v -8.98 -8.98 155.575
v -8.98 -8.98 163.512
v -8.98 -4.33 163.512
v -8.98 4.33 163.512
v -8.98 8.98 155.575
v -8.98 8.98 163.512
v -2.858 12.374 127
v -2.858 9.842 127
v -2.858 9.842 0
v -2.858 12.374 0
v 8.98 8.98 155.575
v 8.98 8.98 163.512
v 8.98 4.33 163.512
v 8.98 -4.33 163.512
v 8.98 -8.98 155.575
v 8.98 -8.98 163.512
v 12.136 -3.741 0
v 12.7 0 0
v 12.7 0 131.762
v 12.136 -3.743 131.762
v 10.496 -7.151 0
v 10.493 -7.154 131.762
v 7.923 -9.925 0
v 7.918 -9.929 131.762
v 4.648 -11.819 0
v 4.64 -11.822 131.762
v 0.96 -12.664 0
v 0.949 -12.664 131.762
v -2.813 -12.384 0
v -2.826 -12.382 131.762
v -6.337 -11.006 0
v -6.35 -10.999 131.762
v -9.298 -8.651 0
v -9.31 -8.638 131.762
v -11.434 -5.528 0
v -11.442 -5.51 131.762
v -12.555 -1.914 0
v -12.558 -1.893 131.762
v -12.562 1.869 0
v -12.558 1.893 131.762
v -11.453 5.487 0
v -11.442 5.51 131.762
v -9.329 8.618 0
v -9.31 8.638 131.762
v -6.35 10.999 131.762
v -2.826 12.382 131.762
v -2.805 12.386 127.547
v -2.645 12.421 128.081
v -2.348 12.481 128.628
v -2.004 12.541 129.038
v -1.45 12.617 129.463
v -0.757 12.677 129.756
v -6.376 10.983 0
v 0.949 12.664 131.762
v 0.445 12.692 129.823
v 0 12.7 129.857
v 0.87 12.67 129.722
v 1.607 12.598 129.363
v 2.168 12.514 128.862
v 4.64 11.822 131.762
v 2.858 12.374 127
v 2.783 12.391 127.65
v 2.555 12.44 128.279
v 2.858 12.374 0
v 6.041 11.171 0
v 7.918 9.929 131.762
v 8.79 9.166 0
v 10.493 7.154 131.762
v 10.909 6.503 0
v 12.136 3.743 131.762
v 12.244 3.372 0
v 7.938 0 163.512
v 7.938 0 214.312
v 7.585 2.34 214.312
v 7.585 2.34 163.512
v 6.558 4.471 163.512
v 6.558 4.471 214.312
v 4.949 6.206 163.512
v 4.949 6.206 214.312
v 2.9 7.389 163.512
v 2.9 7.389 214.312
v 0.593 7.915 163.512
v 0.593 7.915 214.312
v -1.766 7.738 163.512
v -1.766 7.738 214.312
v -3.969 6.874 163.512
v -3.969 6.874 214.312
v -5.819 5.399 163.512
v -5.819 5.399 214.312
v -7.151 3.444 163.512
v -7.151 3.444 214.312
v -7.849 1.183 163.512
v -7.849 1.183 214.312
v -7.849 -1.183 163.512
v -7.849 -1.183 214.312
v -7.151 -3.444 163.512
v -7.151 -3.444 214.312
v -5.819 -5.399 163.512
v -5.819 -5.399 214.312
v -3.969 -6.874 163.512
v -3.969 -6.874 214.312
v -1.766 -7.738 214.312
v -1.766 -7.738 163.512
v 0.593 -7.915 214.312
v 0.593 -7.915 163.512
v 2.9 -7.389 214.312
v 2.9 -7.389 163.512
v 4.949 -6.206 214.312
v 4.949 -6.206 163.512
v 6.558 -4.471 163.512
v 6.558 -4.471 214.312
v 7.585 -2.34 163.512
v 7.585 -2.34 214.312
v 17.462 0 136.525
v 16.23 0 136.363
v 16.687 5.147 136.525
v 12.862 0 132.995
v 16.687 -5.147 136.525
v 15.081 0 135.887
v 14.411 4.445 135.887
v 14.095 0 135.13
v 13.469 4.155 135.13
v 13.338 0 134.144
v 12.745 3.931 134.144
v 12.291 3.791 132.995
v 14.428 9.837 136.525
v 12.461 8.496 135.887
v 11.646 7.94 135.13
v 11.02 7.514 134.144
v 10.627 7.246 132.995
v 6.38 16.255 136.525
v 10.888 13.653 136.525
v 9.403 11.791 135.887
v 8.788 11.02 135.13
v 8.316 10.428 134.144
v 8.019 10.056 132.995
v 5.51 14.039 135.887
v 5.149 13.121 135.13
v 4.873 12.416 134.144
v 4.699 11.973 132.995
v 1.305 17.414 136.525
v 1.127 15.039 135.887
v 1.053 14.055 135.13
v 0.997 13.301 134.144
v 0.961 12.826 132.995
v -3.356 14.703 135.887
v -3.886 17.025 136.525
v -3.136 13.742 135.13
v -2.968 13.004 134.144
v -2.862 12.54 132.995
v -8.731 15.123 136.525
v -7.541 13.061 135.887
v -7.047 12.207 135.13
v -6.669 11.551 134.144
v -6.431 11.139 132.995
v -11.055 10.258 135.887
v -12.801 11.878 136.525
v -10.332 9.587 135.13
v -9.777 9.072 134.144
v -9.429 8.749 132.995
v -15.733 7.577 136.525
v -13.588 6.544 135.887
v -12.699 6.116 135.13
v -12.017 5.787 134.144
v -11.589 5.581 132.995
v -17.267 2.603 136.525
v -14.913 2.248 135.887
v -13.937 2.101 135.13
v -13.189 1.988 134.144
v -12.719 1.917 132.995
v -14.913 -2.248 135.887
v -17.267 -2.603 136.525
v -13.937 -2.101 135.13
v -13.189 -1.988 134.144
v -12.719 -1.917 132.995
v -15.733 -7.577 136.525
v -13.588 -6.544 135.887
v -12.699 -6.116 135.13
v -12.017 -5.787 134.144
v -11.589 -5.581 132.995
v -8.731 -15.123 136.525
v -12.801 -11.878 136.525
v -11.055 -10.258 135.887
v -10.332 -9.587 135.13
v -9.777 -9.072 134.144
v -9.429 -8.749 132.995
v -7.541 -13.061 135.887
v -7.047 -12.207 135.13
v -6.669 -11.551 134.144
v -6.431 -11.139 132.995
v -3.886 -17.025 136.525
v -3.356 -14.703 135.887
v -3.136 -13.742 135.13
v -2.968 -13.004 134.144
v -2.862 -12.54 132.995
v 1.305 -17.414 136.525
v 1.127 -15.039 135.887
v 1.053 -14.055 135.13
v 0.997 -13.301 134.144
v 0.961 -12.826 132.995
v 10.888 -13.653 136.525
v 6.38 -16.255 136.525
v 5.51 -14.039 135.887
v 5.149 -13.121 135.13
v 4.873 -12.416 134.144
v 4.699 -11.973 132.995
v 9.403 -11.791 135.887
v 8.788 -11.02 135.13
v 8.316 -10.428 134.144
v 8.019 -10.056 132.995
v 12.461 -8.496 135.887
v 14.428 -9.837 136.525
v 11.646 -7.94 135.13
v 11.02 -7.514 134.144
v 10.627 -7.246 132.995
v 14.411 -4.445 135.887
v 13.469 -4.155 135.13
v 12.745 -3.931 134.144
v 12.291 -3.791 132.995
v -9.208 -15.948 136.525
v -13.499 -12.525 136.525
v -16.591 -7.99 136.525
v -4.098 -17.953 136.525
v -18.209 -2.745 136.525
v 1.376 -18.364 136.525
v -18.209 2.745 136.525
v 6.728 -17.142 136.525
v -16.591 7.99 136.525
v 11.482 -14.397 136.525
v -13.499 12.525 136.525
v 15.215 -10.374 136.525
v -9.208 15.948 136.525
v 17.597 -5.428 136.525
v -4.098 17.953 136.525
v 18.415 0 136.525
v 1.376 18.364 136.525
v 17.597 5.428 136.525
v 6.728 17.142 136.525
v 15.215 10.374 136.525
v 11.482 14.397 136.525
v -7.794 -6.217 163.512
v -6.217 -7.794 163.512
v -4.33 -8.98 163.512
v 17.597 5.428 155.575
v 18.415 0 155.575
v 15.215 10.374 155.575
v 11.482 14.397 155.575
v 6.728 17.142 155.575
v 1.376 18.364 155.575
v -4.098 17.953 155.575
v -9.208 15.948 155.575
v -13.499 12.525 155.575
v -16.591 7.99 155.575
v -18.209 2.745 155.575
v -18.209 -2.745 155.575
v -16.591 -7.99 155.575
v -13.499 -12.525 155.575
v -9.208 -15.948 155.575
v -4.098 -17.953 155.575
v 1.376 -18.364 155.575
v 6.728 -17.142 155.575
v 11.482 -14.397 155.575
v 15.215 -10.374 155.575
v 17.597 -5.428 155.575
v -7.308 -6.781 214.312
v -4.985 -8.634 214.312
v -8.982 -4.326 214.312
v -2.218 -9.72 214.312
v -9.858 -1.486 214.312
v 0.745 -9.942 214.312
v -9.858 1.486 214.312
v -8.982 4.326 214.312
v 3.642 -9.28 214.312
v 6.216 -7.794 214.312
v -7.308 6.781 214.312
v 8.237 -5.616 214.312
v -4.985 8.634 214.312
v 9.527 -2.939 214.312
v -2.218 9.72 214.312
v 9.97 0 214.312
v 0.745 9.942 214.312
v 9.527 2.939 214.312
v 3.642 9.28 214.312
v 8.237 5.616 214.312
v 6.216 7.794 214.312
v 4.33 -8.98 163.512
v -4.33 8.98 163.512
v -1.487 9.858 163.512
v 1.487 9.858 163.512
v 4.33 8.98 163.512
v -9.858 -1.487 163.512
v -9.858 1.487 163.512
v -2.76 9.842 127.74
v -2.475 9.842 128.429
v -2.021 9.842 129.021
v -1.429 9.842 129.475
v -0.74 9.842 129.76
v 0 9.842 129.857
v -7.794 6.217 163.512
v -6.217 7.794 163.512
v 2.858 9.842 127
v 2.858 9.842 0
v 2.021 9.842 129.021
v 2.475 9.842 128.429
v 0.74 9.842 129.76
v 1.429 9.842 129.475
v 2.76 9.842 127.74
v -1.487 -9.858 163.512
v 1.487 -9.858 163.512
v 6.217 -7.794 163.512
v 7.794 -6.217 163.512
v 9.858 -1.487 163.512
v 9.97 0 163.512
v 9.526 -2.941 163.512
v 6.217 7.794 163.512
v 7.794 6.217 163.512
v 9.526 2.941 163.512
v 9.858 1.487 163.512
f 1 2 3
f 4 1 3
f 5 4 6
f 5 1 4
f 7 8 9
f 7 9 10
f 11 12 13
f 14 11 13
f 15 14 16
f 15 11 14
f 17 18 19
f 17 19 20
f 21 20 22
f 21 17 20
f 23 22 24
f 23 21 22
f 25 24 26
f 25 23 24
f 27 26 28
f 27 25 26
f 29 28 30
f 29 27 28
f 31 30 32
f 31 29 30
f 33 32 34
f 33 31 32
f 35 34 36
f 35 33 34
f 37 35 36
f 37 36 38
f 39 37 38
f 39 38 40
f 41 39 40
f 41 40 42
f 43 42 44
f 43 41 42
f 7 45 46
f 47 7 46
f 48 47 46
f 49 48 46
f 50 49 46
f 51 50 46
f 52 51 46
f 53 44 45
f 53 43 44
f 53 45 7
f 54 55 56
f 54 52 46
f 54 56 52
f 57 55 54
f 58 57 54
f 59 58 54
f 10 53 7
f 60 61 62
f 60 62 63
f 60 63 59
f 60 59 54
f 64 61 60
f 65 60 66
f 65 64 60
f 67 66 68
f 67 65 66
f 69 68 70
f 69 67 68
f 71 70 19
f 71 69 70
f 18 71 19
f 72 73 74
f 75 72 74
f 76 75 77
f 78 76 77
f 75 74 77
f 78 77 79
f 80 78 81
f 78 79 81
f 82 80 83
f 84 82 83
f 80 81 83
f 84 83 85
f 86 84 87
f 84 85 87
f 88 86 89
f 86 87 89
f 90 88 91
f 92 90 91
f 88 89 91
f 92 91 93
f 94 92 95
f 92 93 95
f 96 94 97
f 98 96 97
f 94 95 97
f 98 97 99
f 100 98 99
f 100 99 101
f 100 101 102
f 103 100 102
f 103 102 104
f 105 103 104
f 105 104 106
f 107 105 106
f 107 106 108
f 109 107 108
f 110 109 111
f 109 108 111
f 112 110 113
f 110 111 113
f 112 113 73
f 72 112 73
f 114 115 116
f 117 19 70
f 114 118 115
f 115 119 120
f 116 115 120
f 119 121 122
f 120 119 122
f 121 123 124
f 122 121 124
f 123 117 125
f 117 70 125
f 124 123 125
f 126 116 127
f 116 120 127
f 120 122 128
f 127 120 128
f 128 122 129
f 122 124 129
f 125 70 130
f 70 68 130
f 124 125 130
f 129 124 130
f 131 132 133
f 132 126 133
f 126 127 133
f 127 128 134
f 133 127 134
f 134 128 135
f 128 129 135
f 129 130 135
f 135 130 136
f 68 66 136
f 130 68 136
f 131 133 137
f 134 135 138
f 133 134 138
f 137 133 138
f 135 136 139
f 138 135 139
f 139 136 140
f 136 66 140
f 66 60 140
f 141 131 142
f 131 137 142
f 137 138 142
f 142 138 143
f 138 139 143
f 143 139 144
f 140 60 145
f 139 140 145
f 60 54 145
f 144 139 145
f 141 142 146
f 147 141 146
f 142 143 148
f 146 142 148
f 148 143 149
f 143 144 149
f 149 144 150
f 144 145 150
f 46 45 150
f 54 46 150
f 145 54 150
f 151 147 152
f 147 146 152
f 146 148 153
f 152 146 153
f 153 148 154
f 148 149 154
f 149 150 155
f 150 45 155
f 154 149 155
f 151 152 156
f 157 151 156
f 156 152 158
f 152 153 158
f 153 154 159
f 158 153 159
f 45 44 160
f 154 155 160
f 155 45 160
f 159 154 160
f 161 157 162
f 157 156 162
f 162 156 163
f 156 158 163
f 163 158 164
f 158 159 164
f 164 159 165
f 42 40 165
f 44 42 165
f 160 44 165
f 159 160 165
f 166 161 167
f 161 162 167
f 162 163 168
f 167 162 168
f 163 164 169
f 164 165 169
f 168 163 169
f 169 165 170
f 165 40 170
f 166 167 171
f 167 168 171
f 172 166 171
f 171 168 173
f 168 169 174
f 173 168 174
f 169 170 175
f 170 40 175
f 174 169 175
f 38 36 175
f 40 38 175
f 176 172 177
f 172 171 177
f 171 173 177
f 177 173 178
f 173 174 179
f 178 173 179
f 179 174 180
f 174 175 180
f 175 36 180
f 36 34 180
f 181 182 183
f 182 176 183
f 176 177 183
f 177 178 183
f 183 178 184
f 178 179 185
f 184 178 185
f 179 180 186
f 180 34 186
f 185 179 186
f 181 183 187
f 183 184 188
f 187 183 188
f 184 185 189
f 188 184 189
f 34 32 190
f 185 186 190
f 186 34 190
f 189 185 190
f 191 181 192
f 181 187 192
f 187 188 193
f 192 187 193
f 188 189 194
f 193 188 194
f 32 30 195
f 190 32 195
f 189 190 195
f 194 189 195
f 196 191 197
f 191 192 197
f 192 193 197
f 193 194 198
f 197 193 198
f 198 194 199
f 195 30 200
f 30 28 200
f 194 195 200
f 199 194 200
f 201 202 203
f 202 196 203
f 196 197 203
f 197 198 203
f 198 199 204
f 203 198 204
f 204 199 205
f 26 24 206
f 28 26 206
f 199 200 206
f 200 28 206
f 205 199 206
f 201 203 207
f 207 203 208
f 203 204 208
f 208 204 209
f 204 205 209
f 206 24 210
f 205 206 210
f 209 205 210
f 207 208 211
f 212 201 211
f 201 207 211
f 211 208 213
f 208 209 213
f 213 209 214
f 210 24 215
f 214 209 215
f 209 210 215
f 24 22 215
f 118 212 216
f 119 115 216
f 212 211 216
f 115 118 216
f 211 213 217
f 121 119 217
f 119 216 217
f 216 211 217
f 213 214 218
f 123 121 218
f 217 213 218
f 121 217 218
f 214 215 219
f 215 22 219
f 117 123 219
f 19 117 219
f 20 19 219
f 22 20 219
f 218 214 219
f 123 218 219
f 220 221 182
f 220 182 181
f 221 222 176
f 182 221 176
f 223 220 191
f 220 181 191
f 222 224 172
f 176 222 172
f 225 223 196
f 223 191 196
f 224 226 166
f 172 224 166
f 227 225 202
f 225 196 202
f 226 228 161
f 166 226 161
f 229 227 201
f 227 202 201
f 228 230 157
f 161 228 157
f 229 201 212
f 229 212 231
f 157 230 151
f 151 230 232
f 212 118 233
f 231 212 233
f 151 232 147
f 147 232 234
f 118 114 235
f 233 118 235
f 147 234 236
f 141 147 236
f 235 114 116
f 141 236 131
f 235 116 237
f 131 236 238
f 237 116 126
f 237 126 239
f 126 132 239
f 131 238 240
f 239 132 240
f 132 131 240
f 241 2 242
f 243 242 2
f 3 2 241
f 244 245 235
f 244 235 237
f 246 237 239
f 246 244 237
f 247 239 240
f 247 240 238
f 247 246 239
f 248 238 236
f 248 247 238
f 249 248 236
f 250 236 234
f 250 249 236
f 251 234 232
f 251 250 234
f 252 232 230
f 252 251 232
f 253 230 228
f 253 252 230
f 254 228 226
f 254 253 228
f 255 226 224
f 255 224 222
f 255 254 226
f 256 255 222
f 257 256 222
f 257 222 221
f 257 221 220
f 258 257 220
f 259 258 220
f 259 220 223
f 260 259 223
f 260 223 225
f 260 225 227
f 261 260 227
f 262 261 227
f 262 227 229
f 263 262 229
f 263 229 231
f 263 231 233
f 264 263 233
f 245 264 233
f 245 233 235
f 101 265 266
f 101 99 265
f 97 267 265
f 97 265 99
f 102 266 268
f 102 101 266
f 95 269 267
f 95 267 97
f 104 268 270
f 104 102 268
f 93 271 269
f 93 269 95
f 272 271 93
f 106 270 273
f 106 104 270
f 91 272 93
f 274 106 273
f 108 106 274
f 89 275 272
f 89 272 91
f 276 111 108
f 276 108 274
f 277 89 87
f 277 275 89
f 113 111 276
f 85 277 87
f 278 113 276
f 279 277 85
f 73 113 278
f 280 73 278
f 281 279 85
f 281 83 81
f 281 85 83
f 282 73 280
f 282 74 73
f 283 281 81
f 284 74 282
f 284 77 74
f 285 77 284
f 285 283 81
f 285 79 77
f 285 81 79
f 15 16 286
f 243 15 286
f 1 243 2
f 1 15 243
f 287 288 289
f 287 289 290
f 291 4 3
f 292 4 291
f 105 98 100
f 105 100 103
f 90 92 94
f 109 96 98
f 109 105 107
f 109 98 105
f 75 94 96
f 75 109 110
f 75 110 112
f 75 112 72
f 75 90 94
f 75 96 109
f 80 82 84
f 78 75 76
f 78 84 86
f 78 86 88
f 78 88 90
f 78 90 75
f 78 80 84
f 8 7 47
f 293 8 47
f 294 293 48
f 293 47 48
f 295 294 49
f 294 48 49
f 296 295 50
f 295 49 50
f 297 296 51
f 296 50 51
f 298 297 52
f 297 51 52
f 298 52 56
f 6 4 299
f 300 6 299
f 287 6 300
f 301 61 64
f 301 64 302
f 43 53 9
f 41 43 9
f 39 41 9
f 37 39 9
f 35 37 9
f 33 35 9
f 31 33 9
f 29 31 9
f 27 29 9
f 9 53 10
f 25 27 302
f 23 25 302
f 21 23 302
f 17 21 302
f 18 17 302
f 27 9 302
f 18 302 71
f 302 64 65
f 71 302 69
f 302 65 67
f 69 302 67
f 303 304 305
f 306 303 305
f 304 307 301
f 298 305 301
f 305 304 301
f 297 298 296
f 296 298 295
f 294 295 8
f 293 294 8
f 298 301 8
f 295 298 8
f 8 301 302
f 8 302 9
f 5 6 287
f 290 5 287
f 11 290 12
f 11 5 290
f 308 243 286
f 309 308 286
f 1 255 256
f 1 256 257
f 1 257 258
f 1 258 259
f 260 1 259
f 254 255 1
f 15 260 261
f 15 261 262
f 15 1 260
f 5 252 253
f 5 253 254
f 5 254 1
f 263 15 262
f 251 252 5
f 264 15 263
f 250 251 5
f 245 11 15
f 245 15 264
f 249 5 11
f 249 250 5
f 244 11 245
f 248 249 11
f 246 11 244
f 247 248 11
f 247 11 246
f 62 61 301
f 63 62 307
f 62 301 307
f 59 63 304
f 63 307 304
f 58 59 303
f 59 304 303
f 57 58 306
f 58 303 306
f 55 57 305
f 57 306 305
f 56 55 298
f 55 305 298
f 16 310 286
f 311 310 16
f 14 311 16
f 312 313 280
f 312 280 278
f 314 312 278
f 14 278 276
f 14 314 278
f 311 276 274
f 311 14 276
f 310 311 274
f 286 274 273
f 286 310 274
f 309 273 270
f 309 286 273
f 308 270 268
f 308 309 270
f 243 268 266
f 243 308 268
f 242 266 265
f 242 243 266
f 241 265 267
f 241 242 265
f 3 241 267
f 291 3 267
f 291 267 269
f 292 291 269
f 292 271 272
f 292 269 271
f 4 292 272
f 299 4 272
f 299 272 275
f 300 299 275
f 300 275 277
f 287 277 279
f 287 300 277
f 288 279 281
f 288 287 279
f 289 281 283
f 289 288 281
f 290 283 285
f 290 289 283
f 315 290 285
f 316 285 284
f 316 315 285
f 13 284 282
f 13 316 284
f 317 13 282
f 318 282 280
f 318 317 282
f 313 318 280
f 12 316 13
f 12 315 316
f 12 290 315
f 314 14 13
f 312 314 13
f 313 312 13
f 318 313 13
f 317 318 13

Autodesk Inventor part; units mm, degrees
ref_plane "YZ Plane" through (0, 0, 0) normal (1, 0, 0) x (0, 1, 0)
ref_plane "XZ Plane" through (0, 0, 0) normal (0, 1, 0) x (-1, 0, 0)
sketch "Sketch1" plane through (0, 0, 0) normal (0, 0, 1) x (1, 0, 0)
  circle A0 centre (0, 0) radius 12.7
  dimension "d0" = 25.4
extrude "Extrusion1" add sketch "Sketch1" along normal blind 155.575
sketch "Sketch2" plane through (0, 0, 155.575) normal (0, 0, 1) x (1, 0, 0)
  circle A0 centre (0, 0) radius 12.7 projected
  line L0 (-8.9803, 8.9803) -> (8.9803, 8.9803)
  line L1 (8.9803, 8.9803) -> (8.9803, -8.9803)
  line L2 (8.9803, -8.9803) -> (-8.9803, -8.9803)
  line L3 (-8.9803, -8.9803) -> (-8.9803, 8.9803)
  line L4 (-8.9803, 8.9803) -> (8.9803, -8.9803) construction
  line L5 (8.9803, 8.9803) -> (-8.9803, -8.9803) construction
extrude "Extrusion2" add sketch "Sketch2" along normal blind 7.9375 contours L1 L2 L3 L0
sketch "Sketch3" plane through (0, 0, 163.5125) normal (0, 0, 1) x (1, 0, 0)
  circle A0 centre (0, 0) radius 9.9695
  dimension "d5" = 19.939
extrude "Extrusion3" add sketch "Sketch3" along normal blind 50.8
sketch "Sketch4" plane through (0, 0, 214.3125) normal (0, 0, 1) x (1, 0, 0)
  circle A0 centre (0, 0) radius 7.9375
  dimension "d8" = 15.875
extrude "Extrusion4" cut sketch "Sketch4" against normal up to surface (50.8 mm away)
sketch "Sketch5" plane through (0, 0, 0) normal (0, 0, -1) x (-1, 0, 0)
  line L0 (2.8575, 15.5575) -> (-2.8575, 15.5575)
  line L1 (-2.8575, 15.5575) -> (-2.8575, 9.8425)
  line L2 (-2.8575, 9.8425) -> (2.8575, 9.8425)
  line L3 (2.8575, 9.8425) -> (2.8575, 15.5575)
  arc A0 (8.9803, -8.9803) -> (8.9803, 8.9803) centre (0, 0) ccw projected
  line L4 (2.8575, 15.5575) -> (-2.8575, 9.8425) construction
  line L5 (-2.8575, 15.5575) -> (2.8575, 9.8425) construction
  point P0 (0, 12.7)
  point P1 (0, 12.7)
  dimension "d11" = 5.715
extrude "Extrusion5" cut sketch "Sketch5" against normal blind 129.8575
fillet "Fillet2" radius 2.8575 2 edges at (-2.8575, 11.1084, 129.8575) (2.8575, 11.1084, 129.8575)
sketch "Sketch6" plane through (0, 0, 155.575) normal (0, 0, 1) x (1, 0, 0)
  circle A0 centre (0, 0) radius 18.415
  dimension "d16" = 36.83
ref_plane "Work Plane1" through (0, 12.7, 129.8575) normal (0, 0, 1) x (1, 0, 0)
sketch "Sketch7" plane through (0, 12.7, 129.8575) normal (0, 0, 1) x (1, 0, 0)
  circle A0 centre (0, -12.7) radius 7.9375 projected
  circle A1 centre (0, -12.7) radius 14.097
extrude "Extrusion6" add sketch "Sketch6" against normal blind 19.05
fillet "Fillet3" radius 4.7625 1 edges at (-12.7, 0, 136.525)
properties part number "Adam's Motor Shaft Rev2" material "Steel, Alloy"
